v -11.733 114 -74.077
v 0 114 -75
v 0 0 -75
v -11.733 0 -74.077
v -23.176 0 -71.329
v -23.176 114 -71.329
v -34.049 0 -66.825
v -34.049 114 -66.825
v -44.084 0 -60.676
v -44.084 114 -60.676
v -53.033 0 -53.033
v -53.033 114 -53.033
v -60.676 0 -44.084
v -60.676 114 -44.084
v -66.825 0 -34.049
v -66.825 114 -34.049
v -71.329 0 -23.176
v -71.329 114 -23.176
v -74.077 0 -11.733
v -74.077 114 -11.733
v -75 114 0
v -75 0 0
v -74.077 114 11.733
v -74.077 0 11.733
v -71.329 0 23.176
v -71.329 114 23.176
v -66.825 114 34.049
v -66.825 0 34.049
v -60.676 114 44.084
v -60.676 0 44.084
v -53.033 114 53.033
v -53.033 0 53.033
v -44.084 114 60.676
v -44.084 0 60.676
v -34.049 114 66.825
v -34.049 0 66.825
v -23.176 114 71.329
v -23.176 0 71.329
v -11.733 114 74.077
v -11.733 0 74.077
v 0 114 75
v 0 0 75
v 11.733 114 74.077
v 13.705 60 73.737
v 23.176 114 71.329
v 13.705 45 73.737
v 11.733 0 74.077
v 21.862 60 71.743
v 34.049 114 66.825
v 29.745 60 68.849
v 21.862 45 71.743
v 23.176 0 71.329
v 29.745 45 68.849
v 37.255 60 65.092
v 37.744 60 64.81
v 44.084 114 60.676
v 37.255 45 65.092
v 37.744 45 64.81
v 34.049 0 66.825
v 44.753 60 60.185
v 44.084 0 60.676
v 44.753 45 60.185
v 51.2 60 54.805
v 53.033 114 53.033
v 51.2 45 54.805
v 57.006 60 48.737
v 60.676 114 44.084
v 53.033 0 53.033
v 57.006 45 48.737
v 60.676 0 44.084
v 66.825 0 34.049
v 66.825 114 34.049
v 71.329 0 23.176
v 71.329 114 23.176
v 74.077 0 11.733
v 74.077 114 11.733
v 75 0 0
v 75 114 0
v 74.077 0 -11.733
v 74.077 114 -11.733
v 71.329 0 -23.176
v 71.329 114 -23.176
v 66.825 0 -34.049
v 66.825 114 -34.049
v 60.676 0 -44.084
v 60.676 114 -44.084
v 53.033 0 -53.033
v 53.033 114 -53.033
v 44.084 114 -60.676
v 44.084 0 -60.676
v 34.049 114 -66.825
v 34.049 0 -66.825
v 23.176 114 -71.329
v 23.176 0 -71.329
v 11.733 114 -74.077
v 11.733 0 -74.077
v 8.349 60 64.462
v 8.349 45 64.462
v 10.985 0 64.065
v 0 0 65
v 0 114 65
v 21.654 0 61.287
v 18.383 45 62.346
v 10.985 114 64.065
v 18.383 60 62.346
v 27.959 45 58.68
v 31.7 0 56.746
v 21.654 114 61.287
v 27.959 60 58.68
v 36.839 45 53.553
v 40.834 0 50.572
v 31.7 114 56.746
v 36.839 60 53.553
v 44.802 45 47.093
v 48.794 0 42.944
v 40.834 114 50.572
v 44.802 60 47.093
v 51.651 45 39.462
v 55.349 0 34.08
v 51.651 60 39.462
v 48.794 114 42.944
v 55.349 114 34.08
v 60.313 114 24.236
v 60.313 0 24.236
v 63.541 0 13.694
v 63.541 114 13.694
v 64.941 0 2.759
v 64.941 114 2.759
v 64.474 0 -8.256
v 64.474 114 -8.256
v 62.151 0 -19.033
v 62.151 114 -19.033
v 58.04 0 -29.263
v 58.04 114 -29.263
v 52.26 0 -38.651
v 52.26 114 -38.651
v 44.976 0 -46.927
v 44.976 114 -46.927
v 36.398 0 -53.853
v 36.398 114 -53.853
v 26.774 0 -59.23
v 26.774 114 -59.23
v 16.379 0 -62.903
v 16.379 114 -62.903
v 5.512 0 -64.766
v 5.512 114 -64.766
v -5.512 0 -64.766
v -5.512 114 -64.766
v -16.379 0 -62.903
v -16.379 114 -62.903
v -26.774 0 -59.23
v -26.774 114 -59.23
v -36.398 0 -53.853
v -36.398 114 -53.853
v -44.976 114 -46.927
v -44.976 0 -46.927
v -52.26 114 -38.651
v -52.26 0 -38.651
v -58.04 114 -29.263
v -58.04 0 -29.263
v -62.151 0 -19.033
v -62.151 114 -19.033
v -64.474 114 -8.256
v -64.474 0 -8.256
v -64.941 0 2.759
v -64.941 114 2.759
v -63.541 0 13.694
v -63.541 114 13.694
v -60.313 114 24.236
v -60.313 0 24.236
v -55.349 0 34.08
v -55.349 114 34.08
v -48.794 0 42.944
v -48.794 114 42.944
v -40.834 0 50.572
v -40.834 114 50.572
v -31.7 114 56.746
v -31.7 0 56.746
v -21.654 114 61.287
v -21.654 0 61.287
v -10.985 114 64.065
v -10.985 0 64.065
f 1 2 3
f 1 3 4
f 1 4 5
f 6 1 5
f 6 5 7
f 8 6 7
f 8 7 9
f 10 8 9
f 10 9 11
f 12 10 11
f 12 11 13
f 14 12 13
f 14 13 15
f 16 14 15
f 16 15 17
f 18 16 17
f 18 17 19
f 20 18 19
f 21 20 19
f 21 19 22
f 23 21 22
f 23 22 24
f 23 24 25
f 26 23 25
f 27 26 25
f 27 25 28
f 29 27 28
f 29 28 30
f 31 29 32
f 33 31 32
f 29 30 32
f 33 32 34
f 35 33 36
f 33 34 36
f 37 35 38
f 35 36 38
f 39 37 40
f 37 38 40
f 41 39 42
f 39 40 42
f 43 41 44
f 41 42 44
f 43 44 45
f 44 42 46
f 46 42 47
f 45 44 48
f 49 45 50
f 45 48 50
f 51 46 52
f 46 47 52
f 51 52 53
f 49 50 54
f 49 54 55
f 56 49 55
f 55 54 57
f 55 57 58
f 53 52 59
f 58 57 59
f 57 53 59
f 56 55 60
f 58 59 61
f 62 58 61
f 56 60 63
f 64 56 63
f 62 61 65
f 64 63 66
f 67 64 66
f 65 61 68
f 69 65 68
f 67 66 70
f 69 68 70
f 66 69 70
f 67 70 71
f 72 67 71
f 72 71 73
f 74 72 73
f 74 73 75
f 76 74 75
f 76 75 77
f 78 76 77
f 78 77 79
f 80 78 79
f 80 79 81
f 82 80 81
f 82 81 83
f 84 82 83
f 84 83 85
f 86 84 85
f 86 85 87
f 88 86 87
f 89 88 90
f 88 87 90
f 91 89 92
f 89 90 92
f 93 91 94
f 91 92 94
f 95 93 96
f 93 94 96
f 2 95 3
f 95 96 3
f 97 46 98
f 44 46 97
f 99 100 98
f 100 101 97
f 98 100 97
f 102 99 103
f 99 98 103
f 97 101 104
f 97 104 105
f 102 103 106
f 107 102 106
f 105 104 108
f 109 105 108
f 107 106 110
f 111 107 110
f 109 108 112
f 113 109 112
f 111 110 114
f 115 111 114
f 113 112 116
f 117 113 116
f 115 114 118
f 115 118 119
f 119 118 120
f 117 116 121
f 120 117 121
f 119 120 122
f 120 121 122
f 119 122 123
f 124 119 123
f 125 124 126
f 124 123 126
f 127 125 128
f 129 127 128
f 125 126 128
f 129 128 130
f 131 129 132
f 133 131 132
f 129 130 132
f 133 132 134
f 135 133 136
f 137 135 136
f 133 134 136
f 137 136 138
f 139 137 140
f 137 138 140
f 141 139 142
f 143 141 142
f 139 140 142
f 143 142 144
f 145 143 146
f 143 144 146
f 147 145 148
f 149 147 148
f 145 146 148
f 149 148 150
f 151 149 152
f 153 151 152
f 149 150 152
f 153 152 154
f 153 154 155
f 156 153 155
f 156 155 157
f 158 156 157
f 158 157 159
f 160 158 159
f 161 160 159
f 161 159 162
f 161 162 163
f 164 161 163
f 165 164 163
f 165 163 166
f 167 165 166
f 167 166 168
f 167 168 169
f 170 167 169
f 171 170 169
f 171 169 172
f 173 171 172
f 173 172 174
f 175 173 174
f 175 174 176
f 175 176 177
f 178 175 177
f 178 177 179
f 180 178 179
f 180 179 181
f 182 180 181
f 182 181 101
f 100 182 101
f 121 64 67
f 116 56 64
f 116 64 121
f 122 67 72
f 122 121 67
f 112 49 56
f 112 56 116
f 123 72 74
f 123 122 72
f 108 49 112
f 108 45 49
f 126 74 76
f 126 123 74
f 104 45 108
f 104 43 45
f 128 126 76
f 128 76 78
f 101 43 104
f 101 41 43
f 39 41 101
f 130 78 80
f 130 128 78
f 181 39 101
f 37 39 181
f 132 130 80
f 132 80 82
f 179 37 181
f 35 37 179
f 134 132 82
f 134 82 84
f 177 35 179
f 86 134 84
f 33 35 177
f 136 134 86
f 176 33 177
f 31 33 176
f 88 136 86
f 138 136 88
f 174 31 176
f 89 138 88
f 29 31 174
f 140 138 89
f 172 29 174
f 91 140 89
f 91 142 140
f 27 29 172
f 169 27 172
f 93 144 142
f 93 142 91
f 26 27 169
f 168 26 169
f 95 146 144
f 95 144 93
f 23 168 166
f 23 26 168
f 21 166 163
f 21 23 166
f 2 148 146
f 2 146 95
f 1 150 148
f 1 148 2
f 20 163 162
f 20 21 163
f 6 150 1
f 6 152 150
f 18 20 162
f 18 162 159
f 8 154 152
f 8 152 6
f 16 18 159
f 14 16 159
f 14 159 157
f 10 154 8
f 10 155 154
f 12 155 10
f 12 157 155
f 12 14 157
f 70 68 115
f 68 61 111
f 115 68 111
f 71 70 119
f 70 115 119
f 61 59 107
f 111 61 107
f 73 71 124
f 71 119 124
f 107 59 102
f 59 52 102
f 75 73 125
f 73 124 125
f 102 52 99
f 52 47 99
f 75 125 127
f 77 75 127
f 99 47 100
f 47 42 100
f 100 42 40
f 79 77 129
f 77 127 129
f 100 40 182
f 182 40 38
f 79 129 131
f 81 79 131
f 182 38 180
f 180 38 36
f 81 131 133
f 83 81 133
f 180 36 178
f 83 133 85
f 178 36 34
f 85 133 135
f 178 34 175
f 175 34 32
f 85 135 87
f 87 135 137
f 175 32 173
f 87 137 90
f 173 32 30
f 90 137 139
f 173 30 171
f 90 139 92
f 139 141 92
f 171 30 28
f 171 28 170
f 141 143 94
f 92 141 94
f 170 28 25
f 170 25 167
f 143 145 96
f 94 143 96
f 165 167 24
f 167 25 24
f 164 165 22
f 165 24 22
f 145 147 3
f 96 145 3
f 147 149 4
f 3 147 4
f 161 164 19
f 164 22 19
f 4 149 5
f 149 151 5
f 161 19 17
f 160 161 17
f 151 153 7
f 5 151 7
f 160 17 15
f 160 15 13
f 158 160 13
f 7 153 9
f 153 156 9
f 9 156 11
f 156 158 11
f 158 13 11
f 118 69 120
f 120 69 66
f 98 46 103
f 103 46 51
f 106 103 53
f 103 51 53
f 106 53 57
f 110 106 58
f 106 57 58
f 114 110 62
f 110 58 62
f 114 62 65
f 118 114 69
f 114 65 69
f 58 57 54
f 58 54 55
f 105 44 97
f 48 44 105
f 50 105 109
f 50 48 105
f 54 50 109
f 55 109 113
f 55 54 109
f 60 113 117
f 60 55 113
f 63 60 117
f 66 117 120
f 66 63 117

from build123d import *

# Parameters (mm, degrees)
SKETCH1_R           = 75
BOSS_EXTRUDE1_DEPTH = 114
SKETCH2_R           = 65
CUT_EXTRUDE1_DEPTH  = 120
SKETCH3_W           = 50
SKETCH3_H           = 15
CUT_EXTRUDE2_DEPTH  = 15


with BuildPart() as part:
    # Sketch1 → Boss-Extrude1 (new body)
    with BuildSketch(Plane(origin=(0, 0, 0), x_dir=(1, 0, 0), z_dir=(0, 1, 0))):
        with Locations(Location((0, 0, 0), (0, 0, 90))):
            Circle(SKETCH1_R)
    extrude(amount=BOSS_EXTRUDE1_DEPTH)

    # Sketch2 → Cut-Extrude1 (cut)
    with BuildSketch(Plane(origin=(0, 114, 0), x_dir=(1, 0, 0), z_dir=(0, 1, 0))):
        with Locations(Location((0, 0, 0), (0, 0, 270))):
            Circle(SKETCH2_R)
    extrude(amount=-CUT_EXTRUDE1_DEPTH, mode=Mode.SUBTRACT)

    # Sketch3 → Cut-Extrude2 (cut)
    with BuildSketch(Plane(origin=(37.49973472, 0, 64.951445805), x_dir=(0.8660254037844382, 0, -0.5000000000000011), z_dir=(0.5000000000000011, 6.982962677686268e-15, 0.8660254037844382))):
        with Locations((0, 52.5)):
            Rectangle(SKETCH3_W, SKETCH3_H)
    extrude(amount=-CUT_EXTRUDE2_DEPTH, mode=Mode.SUBTRACT)


solid = part.part
